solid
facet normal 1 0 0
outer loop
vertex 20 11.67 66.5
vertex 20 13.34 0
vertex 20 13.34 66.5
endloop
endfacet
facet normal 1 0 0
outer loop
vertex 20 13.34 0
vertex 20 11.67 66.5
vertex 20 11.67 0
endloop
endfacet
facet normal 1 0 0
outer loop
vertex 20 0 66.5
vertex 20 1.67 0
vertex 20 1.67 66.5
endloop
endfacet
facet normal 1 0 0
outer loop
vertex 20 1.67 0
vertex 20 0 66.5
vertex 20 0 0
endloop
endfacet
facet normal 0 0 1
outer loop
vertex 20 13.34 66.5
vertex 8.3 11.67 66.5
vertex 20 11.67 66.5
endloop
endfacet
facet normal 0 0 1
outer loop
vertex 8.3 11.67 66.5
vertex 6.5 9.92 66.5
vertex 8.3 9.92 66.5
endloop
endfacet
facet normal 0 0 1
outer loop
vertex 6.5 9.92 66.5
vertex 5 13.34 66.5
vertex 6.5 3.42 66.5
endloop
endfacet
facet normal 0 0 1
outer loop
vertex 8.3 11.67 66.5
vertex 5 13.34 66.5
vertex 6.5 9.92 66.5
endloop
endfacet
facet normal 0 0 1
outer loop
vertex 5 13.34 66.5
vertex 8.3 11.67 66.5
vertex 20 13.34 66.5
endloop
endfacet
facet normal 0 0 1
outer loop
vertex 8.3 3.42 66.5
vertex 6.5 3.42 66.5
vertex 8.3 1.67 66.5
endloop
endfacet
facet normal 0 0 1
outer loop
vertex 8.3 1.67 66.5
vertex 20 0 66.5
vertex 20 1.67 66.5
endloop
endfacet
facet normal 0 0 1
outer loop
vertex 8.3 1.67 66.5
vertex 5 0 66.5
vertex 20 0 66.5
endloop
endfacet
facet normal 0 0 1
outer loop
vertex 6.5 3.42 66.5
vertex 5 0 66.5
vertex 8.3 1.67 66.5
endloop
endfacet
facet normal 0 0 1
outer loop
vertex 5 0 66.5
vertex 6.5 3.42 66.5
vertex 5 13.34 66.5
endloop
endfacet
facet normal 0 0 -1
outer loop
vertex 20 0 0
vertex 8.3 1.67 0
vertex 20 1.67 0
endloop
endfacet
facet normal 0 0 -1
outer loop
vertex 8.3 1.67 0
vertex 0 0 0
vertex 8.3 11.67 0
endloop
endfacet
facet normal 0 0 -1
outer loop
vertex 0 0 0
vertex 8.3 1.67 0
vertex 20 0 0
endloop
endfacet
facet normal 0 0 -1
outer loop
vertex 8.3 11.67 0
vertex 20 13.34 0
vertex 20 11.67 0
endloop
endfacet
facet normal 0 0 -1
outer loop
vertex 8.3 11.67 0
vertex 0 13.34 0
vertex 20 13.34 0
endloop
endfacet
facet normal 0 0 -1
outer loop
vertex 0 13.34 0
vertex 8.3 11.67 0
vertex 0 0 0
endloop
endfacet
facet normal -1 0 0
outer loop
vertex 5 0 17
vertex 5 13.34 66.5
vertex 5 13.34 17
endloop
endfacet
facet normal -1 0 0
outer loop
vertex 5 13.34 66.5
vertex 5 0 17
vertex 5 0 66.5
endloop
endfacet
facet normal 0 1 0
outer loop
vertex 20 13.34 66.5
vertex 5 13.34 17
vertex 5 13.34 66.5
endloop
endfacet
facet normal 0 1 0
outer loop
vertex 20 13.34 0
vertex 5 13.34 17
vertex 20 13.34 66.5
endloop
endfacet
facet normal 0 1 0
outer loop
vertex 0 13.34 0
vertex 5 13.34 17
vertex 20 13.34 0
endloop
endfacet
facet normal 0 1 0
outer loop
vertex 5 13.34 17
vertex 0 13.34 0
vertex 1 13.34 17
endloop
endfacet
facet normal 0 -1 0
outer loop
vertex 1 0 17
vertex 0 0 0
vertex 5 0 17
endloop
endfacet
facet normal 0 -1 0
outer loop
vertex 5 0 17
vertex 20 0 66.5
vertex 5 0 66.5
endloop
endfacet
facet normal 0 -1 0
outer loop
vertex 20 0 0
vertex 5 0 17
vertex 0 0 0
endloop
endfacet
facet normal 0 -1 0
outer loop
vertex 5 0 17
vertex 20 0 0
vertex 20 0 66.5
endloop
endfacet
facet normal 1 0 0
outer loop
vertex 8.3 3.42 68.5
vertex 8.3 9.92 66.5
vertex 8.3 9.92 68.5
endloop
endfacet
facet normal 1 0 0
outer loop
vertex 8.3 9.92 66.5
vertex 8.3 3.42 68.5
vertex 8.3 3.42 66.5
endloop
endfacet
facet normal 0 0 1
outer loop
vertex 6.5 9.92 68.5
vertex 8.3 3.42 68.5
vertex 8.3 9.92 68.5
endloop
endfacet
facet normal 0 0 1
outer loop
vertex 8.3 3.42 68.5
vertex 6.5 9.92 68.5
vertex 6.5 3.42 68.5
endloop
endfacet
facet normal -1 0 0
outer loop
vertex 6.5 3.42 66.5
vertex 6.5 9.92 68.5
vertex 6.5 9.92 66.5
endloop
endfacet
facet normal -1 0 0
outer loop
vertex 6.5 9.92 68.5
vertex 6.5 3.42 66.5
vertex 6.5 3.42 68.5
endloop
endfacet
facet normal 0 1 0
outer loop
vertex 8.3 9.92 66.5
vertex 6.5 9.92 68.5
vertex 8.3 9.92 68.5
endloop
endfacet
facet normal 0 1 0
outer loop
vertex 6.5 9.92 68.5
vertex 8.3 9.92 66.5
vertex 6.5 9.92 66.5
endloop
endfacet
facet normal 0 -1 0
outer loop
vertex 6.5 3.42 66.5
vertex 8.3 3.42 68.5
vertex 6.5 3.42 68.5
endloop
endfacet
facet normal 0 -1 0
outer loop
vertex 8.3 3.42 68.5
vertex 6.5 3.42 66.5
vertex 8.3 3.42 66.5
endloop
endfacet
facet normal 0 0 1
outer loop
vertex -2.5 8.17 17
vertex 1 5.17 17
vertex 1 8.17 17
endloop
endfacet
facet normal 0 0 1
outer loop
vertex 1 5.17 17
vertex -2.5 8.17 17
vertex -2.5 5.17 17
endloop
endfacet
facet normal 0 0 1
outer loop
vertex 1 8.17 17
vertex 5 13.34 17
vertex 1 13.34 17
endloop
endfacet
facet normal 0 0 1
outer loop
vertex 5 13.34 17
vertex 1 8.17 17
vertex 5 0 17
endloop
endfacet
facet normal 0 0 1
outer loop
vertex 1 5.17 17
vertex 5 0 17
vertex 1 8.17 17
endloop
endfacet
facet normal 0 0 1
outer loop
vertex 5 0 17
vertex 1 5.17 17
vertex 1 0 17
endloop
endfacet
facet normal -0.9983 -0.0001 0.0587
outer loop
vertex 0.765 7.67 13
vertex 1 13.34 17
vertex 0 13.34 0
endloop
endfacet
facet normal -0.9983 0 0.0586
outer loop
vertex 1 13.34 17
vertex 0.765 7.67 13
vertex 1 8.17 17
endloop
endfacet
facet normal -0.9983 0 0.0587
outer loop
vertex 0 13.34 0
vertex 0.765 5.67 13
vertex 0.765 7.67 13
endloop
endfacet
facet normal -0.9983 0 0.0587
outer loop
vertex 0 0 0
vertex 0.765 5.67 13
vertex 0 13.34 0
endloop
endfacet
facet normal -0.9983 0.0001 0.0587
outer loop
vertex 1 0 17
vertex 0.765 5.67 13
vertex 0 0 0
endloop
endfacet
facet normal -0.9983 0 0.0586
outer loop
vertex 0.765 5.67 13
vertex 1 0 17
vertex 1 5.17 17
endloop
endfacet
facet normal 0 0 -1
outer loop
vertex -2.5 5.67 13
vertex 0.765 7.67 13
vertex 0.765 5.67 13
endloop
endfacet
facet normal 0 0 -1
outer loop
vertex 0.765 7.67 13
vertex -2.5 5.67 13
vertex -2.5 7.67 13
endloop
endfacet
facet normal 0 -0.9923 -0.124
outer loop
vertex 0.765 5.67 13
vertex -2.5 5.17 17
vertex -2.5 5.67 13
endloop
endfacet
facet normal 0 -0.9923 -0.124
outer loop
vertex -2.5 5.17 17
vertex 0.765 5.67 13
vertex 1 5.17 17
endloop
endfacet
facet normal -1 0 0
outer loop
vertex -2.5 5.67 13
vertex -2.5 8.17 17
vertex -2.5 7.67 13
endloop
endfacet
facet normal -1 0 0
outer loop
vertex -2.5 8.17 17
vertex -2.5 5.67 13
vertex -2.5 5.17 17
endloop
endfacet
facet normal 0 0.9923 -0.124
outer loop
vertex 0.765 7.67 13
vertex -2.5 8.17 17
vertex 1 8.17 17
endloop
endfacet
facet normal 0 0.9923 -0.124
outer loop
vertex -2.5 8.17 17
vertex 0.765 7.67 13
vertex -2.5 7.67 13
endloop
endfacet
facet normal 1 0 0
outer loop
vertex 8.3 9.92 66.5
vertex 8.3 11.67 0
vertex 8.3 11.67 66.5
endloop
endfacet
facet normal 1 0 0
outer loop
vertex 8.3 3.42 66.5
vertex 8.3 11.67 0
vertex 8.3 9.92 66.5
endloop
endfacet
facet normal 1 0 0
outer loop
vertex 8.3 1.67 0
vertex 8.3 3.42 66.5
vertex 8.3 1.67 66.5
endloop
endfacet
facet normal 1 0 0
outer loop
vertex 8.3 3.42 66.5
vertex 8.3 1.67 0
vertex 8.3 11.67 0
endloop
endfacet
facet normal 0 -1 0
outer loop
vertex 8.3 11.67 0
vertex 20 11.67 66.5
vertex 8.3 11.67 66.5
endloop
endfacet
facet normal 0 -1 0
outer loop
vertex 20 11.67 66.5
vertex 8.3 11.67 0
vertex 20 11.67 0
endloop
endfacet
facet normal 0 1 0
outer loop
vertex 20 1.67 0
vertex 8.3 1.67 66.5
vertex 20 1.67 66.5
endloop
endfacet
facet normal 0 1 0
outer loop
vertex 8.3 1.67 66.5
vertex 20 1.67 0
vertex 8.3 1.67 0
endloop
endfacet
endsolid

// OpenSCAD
/*
 * Desk Drawer Divider (King Büromöbel Systeme)
 *
 * Author: Pavel Rampas
 * Version: 1.0.0 (Changelog is at the bottom)
 * License: CC BY-SA 4.0 [https://creativecommons.org/licenses/by-sa/4.0/]
 * Link: https://github.com/pavelrampas/openscad-models
 *
 * OpenSCAD version: 2021.01
 *
 * Instructions:
 * Set up parameters, render and print.
 *
 * Height is layer.
 * Thickness is perimeter.
 */

// Parameters
//------------------------------------------------------------------------------

$fn = $preview ? 15 : 90;

wallThickness = 10;

// Parameters that don't need to be changed
//------------------------------------------------------------------------------
thickness = 1.67;

height = 66.5;
length = 15;

bHolderX = 1.8;
bHolderY = 6.5;
bHolderZ = 2;
bHolderXMove = 1.5;

toothX = 5; // bottom X size
toothZ = 17; // tooth height

// Code
//------------------------------------------------------------------------------

width = (2 * thickness) + wallThickness;

difference() {
    union() {
        // main part
        translate([toothX, 0, 0]) {
            cube([length, width, height]);
        }

        // bottom holder
        translate([
            toothX + bHolderXMove,
            ( width / 2 ) - ( bHolderY/2 ),
            height
        ]) {
            cube([bHolderX, bHolderY, bHolderZ]);
        }

        // tooth
        cubePointsTooth = [
          [0, 0, 0],
          [toothX, 0, 0],
          [toothX, width, 0],
          [0, width, 0],
          [1, 0, toothZ],
          [toothX, 0, toothZ],
          [toothX, width, toothZ],
          [1, width, toothZ]
        ];
        cubeFacesTooth = [
          [0,1,2,3],
          [4,5,1,0],
          [7,6,5,4],
          [5,6,2,1],
          [6,7,3,2],
          [7,4,0,3]
        ];
        polyhedron( cubePointsTooth, cubeFacesTooth );

        // side holder
        sHolderX = -(7.5 - toothX);
        sHolderYA = width/2 - 1.5;
        sHolderYB = width/2 + 1.5;
        sHolderZ = toothZ - 4;
        cubePointsHolder = [
          [sHolderX, sHolderYA + 0.5, sHolderZ],
          [toothX, sHolderYA + 0.5, sHolderZ],
          [toothX, sHolderYB - 0.5, sHolderZ],
          [sHolderX, sHolderYB - 0.5, sHolderZ],
          [sHolderX, sHolderYA, toothZ],
          [toothX, sHolderYA, toothZ],
          [toothX, sHolderYB, toothZ],
          [sHolderX, sHolderYB, toothZ]
        ];
        cubeFacesHolder = [
          [0,1,2,3],
          [4,5,1,0],
          [7,6,5,4],
          [5,6,2,1],
          [6,7,3,2],
          [7,4,0,3]
        ];
        polyhedron( cubePointsHolder, cubeFacesHolder );
    }

    // hole for the wall
    translate([toothX + bHolderX + bHolderXMove, thickness, 0]) {
        cube([length, width - (2 * thickness), height]);
    }
}

// Functions
//------------------------------------------------------------------------------

// Modules
//------------------------------------------------------------------------------

// Changelog
//------------------------------------------------------------------------------

// [1.0.0]:
// Initial release.
